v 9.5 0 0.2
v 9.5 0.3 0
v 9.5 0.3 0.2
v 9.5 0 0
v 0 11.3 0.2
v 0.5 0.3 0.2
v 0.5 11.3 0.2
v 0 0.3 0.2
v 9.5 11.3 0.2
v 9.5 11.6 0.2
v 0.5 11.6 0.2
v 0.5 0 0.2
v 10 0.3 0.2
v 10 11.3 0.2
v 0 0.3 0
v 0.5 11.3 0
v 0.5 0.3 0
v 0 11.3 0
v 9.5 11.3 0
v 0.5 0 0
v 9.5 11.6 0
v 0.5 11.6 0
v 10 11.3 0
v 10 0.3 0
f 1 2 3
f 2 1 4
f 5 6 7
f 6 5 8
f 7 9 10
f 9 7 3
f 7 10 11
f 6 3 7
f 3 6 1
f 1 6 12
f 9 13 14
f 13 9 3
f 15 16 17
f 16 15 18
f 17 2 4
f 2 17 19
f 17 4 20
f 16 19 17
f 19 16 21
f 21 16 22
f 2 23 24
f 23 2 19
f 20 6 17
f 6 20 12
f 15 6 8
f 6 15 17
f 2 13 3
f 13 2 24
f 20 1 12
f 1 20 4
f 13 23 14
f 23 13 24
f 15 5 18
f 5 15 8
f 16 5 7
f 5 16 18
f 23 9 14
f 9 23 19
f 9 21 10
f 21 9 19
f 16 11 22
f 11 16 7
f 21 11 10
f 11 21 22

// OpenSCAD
// Units are in centimeters.

module body () {
    cube([10, 11, 0.2]);
}

module jaggedEdge () {
    cube([9, 0.3, 0.2]);
}

union () {
    translate([0.5, 0, 0]) jaggedEdge();
    translate([0, 0.3, 0]) body();
    translate([0.5, 11.3, 0]) jaggedEdge();
};
